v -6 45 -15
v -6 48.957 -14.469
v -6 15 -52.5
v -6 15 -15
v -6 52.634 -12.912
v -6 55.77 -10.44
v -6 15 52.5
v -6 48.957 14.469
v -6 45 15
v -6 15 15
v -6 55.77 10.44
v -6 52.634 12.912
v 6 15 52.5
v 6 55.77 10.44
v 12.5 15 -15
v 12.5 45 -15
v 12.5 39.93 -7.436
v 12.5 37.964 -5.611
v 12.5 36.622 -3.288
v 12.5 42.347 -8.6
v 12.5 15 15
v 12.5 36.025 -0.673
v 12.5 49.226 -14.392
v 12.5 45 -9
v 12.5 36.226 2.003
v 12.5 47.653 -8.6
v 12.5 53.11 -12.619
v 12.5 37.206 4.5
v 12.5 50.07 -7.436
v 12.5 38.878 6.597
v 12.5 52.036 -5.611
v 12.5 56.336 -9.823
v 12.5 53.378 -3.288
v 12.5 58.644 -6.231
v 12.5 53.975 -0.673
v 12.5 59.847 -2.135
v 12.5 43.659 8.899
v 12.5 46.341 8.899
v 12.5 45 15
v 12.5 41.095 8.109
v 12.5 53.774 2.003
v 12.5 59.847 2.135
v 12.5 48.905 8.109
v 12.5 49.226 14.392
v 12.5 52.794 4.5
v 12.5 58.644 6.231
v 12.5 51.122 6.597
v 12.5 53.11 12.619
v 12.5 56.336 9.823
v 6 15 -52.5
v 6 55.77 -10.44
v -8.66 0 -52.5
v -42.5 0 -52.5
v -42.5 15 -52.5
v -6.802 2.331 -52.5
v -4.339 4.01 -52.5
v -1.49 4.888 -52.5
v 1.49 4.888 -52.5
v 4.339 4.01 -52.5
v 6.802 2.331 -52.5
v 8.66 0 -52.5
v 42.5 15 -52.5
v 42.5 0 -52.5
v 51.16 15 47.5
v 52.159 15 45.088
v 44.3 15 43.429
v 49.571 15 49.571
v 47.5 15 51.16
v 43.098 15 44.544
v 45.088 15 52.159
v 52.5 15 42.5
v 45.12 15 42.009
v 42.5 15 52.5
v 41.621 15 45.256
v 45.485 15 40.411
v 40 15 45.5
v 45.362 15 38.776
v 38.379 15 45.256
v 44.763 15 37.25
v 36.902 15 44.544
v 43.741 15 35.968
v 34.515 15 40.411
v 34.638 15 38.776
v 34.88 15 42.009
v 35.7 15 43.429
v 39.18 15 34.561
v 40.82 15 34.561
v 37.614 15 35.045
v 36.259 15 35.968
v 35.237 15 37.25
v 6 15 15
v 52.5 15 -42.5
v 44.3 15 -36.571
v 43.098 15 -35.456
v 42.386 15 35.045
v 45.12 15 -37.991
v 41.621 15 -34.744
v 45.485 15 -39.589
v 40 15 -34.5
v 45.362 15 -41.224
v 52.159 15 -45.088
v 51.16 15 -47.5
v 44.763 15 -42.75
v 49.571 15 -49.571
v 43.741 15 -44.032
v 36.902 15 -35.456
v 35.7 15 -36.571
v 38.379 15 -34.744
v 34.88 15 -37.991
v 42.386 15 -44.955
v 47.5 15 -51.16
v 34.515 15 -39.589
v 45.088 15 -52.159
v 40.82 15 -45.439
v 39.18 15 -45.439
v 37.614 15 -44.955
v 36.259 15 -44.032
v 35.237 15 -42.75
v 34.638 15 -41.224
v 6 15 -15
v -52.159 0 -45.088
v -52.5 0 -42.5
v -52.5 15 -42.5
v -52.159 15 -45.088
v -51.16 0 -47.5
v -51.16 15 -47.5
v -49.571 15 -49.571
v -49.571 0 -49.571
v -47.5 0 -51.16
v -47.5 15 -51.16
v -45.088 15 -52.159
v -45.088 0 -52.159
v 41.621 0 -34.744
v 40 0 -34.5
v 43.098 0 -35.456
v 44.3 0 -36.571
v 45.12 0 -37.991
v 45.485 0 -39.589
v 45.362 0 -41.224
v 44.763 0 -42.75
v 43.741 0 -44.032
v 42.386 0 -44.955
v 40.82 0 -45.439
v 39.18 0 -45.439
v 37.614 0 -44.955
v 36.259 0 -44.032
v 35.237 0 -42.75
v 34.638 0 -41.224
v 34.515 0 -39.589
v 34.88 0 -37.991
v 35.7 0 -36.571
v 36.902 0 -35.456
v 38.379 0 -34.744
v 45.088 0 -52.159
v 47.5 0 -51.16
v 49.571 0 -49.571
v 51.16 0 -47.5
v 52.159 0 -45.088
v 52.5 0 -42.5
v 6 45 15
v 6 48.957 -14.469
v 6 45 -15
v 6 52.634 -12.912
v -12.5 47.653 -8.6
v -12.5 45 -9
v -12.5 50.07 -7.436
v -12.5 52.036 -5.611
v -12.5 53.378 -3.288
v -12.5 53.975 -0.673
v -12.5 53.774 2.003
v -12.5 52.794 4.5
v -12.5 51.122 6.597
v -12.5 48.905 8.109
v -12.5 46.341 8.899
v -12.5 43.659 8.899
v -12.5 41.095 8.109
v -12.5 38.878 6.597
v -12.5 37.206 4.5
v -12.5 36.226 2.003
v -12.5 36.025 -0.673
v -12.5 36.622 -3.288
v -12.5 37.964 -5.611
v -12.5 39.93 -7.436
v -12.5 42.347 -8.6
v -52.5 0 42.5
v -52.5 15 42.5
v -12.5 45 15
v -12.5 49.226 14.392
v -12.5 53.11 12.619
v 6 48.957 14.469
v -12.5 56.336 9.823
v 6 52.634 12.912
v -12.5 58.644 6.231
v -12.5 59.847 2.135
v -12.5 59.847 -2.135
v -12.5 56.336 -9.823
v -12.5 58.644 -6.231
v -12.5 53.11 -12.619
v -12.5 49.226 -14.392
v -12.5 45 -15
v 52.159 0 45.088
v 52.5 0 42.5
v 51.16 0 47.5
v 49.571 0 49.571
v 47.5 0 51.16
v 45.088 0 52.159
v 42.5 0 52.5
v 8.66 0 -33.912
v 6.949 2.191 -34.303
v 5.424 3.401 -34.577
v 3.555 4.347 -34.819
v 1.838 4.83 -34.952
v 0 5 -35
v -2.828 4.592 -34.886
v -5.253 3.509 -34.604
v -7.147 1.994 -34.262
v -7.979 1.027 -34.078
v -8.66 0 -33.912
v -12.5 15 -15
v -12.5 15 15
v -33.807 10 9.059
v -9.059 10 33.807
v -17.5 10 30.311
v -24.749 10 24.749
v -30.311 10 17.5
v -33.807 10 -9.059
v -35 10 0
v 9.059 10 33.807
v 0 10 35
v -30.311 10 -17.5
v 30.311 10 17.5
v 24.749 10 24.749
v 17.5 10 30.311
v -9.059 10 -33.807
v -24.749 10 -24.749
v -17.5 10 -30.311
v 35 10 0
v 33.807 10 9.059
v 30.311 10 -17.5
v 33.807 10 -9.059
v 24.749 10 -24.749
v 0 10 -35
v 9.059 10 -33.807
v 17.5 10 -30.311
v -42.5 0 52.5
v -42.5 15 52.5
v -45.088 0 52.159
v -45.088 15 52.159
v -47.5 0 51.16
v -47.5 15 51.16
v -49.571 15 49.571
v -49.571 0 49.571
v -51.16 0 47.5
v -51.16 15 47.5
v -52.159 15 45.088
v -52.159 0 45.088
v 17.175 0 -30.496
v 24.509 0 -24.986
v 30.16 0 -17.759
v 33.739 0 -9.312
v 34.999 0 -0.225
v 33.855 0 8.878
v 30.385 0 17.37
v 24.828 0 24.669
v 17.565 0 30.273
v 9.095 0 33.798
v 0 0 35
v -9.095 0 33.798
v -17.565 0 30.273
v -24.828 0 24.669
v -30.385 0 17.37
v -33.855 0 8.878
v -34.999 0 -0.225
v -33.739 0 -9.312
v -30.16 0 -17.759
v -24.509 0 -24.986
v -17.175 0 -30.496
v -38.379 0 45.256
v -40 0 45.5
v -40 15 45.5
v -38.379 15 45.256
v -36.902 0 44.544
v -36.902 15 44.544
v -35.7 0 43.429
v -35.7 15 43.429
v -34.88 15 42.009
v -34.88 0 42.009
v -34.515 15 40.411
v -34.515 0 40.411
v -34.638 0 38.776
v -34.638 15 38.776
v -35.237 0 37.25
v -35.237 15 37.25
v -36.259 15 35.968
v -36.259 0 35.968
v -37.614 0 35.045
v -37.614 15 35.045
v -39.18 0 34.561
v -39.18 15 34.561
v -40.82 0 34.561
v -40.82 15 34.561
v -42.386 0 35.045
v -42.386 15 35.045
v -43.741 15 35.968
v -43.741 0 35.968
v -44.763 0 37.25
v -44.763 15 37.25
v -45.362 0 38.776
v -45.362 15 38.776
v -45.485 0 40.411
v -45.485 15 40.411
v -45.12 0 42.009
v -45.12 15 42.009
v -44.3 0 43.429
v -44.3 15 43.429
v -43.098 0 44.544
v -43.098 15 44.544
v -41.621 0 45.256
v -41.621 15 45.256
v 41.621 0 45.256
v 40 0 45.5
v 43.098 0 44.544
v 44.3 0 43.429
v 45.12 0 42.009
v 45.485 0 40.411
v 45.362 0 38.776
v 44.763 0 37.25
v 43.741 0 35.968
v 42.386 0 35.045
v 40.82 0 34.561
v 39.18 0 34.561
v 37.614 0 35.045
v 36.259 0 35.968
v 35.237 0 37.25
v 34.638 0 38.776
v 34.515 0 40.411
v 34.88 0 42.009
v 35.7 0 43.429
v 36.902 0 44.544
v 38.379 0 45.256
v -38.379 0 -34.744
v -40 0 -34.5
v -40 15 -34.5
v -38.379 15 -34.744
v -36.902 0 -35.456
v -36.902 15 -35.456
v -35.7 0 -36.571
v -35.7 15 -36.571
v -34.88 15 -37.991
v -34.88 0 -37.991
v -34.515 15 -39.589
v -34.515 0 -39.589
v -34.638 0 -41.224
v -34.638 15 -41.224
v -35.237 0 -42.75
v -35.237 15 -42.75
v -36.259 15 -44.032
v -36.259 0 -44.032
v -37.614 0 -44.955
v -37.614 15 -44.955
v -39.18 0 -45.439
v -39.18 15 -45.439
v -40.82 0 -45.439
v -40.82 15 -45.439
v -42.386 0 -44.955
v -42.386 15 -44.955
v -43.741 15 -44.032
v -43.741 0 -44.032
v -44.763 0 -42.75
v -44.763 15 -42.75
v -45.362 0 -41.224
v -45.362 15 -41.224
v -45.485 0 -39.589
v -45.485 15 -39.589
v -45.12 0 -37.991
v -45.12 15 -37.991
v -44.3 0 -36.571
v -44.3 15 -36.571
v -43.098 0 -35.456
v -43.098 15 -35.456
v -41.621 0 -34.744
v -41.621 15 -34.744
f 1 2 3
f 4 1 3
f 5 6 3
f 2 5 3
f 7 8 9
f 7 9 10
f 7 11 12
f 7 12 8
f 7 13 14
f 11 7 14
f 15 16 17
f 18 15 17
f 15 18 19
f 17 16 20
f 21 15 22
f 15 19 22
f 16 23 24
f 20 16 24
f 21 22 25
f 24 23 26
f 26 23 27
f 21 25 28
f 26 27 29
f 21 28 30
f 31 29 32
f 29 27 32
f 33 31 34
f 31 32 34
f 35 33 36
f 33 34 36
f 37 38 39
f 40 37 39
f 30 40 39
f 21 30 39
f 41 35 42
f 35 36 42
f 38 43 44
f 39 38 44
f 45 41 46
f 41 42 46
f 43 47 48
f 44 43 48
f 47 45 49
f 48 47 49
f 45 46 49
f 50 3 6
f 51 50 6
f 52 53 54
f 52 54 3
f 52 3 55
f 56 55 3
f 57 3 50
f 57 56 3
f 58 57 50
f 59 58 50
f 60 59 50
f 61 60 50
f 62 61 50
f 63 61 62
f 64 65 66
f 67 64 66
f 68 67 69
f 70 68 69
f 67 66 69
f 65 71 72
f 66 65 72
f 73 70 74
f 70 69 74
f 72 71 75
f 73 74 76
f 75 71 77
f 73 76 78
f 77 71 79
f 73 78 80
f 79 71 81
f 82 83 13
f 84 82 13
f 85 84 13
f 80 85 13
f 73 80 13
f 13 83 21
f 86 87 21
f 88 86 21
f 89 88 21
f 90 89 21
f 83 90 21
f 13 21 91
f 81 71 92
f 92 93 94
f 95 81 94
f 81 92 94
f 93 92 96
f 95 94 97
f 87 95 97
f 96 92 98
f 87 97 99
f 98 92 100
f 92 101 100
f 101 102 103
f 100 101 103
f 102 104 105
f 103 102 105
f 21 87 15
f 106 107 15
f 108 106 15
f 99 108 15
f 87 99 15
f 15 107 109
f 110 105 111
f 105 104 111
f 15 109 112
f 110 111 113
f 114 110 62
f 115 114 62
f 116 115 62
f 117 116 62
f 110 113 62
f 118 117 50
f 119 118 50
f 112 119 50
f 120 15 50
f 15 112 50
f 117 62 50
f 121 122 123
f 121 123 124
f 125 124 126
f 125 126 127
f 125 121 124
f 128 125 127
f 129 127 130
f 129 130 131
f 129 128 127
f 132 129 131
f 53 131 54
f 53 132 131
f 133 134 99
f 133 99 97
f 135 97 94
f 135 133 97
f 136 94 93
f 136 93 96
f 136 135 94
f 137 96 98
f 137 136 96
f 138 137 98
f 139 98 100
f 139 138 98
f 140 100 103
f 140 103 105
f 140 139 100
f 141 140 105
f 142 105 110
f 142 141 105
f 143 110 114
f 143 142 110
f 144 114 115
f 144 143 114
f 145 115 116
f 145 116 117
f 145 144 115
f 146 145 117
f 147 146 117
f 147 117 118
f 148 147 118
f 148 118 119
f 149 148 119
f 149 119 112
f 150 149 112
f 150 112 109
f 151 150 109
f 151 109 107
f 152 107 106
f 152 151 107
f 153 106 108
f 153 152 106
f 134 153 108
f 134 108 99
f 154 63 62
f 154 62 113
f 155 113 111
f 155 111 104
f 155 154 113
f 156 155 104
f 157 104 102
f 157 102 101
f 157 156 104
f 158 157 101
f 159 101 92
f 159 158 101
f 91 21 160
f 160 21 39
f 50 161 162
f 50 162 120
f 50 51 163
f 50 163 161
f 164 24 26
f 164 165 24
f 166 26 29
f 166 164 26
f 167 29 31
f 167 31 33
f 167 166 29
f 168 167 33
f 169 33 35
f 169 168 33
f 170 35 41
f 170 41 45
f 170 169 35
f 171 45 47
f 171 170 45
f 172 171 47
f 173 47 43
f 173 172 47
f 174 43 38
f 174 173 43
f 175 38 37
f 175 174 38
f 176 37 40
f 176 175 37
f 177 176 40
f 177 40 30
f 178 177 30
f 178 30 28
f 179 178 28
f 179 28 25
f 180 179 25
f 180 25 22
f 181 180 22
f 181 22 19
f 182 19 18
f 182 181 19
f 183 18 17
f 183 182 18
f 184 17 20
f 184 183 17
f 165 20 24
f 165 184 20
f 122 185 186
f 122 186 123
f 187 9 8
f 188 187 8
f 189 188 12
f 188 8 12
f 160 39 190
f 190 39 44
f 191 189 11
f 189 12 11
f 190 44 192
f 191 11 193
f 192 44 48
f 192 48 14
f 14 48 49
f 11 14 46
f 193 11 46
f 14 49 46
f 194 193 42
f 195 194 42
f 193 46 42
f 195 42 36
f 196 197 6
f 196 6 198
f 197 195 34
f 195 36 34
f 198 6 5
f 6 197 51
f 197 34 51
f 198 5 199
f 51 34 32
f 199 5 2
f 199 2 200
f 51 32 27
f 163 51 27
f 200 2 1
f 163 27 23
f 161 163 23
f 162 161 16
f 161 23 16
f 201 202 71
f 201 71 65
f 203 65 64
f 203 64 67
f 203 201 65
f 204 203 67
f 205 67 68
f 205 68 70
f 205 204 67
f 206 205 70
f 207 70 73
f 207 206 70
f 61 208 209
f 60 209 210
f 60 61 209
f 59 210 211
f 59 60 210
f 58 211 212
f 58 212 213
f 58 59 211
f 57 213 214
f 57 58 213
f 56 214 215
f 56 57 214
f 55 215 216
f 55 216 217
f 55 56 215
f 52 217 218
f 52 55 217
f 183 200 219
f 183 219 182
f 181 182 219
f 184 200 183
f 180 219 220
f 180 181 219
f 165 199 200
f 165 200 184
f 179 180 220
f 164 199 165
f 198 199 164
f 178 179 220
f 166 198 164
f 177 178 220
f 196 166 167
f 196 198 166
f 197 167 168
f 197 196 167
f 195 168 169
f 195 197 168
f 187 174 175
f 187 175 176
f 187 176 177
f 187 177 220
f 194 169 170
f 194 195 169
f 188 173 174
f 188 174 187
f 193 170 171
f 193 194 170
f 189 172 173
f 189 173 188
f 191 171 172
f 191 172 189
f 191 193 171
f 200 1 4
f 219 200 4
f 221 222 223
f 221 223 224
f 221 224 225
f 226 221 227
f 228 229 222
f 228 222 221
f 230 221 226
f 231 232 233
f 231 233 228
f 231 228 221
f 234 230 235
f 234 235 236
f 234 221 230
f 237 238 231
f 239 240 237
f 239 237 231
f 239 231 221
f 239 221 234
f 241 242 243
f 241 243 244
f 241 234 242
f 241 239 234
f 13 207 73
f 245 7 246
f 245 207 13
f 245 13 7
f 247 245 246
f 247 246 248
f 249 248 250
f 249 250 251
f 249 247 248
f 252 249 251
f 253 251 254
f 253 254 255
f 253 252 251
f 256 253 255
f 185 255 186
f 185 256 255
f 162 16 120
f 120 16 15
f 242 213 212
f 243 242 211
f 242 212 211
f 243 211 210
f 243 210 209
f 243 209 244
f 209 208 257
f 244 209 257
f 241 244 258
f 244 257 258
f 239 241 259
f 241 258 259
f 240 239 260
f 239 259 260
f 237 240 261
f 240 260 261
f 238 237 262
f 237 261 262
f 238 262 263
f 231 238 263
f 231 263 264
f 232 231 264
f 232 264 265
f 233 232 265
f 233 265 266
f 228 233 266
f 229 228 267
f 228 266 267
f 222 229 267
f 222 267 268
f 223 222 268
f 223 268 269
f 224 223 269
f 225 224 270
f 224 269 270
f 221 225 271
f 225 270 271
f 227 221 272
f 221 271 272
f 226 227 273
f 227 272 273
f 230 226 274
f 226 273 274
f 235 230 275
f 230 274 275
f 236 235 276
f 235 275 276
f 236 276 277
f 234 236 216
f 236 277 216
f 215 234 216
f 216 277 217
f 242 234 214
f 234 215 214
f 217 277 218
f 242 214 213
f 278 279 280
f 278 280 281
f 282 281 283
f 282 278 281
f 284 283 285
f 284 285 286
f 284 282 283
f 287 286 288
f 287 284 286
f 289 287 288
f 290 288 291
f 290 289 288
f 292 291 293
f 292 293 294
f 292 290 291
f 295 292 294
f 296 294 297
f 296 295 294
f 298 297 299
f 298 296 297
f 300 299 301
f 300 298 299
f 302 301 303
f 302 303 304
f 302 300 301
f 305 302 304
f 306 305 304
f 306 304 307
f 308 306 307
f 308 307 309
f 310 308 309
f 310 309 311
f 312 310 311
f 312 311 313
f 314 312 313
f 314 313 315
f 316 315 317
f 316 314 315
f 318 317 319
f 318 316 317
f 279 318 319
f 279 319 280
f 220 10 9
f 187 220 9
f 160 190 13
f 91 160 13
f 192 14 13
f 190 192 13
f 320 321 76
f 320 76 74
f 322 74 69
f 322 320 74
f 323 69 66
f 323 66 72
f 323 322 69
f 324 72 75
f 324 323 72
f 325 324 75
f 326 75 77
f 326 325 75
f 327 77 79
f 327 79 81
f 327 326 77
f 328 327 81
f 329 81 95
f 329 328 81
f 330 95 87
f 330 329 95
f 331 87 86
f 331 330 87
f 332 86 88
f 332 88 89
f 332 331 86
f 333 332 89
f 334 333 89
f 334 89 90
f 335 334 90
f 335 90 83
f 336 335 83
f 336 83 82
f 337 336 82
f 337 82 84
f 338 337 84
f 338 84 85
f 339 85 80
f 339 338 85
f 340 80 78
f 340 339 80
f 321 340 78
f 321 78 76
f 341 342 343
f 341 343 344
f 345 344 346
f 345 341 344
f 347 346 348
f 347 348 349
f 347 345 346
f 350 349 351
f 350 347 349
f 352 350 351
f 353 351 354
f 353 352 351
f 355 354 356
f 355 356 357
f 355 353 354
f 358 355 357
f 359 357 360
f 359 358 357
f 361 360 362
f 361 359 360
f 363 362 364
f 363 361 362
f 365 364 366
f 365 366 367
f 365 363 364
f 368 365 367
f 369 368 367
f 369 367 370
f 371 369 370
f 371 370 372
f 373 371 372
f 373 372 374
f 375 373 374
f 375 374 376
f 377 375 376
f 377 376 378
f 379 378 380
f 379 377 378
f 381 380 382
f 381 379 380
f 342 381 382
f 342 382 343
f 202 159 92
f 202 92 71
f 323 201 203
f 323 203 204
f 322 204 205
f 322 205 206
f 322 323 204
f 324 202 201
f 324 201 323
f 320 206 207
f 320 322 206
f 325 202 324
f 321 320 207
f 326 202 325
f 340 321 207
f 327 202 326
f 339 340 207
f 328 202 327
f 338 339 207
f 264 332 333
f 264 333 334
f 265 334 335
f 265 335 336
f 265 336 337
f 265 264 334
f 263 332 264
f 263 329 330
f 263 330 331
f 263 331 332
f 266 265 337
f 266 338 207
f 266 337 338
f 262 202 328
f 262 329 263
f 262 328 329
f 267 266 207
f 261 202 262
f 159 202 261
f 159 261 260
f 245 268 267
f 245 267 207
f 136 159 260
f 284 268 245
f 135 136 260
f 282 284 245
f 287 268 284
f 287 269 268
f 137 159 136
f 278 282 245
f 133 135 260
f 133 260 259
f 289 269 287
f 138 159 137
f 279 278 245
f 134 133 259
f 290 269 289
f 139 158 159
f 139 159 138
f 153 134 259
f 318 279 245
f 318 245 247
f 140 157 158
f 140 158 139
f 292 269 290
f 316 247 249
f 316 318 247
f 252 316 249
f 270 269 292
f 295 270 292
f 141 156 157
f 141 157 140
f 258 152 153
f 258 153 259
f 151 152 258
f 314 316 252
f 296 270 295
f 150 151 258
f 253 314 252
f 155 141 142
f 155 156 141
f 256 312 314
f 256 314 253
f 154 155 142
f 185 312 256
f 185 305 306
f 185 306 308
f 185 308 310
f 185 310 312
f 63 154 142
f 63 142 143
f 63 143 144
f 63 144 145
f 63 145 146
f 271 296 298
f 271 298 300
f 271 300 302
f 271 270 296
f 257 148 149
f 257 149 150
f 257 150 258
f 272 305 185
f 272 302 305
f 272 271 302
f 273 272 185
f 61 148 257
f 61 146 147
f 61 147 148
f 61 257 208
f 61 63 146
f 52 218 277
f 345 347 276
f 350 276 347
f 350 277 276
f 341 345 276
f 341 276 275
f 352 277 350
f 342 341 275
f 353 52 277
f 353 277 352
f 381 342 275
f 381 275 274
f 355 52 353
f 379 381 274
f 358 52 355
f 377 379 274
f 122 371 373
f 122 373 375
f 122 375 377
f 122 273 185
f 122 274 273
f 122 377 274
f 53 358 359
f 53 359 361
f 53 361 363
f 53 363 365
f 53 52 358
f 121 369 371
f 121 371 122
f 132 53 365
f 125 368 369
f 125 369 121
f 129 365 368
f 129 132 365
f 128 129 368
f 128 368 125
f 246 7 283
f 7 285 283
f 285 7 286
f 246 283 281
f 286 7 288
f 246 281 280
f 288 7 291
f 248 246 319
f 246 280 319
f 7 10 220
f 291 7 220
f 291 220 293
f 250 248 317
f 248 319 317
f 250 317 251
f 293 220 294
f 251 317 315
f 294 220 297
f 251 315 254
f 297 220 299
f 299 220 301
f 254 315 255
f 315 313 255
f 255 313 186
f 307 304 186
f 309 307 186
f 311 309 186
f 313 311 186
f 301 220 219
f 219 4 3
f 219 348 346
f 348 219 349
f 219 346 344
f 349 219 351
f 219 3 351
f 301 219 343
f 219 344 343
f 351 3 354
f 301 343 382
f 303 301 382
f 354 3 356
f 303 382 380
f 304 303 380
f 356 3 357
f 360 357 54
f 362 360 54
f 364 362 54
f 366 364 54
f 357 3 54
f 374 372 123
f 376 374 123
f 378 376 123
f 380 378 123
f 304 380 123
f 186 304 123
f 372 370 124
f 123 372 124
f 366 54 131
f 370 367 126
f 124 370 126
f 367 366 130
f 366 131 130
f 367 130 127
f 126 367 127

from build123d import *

# Parameters (mm, degrees)
SKETCH_1_R          = 5.5
EXTRUDE_1_DEPTH     = 15
SKETCH_2_R          = 35
CUT_EXTRUDE_1_DEPTH = 10
SKETCH_3_R          = 10
CUT_EXTRUDE_2_DEPTH = 18.58835
SKETCH_5_R          = 9
EXTRUDE_2_DEPTH     = 12.5
EXTRUDE_3_DEPTH     = 6


with BuildPart() as part:
    # Эскиз1 → Бобышка-Вытянуть1 (new body)
    with BuildSketch(Plane(origin=(0, 0, 0), x_dir=(1, 0, 0), z_dir=(0, 1, 0))):
        with BuildLine():
            Line((42.5, -52.5), (-42.5, -52.5))
            ThreePointArc((-42.5, -52.5), (-49.571067812, -49.571067812), (-52.5, -42.5))
            Line((-52.5, -42.5), (-52.5, 42.5))
            ThreePointArc((-52.5, 42.5), (-49.571067812, 49.571067812), (-42.5, 52.5))
            Line((-42.5, 52.5), (42.5, 52.5))
            ThreePointArc((42.5, 52.5), (49.571067812, 49.571067812), (52.5, 42.5))
            Line((52.5, 42.5), (52.5, -42.5))
            ThreePointArc((52.5, -42.5), (49.571067812, -49.571067812), (42.5, -52.5))
        make_face()
        with Locations(Location((-40, -40, 0), (0, 0, 270))):
            Circle(SKETCH_1_R, mode=Mode.SUBTRACT)
        with Locations(Location((-40, 40, 0), (0, 0, 270))):
            Circle(SKETCH_1_R, mode=Mode.SUBTRACT)
        with Locations(Location((40, 40, 0), (0, 0, 270))):
            Circle(SKETCH_1_R, mode=Mode.SUBTRACT)
        with Locations(Location((40, -40, 0), (0, 0, 270))):
            Circle(SKETCH_1_R, mode=Mode.SUBTRACT)
    extrude(amount=EXTRUDE_1_DEPTH)

    # Эскиз2 → Вырез-Вытянуть1 (cut)
    with BuildSketch(Plane.XZ):
        with Locations(Location((0, 0, 0), (0, 0, 270))):
            Circle(SKETCH_2_R)
    extrude(amount=-CUT_EXTRUDE_1_DEPTH, mode=Mode.SUBTRACT)

    # Эскиз3 → Вырез-Вытянуть2 (cut)
    with BuildSketch(Plane.XY.offset(-52.5)):
        with Locations((0, -5)):
            Circle(SKETCH_3_R)
    extrude(amount=CUT_EXTRUDE_2_DEPTH, mode=Mode.SUBTRACT)

    # Эскиз5 → Бобышка-Вытянуть2 (add, symmetric)
    with BuildSketch(Plane(origin=(0, 0, 0), x_dir=(0, 0, -1), z_dir=(1, 0, 0))):
        with BuildLine():
            Line((15, 45), (15, 15))
            Line((15, 15), (-15, 15))
            Line((-15, 15), (-15, 45))
            ThreePointArc((-15, 45), (0, 60), (15, 45))
        make_face()
        with Locations((0, 45)):
            Circle(SKETCH_5_R, mode=Mode.SUBTRACT)
    extrude(amount=EXTRUDE_2_DEPTH, both=True)

    # Эскиз7 → Бобышка-Вытянуть3 (add, symmetric)
    with BuildSketch(Plane(origin=(0, 0, 0), x_dir=(0, 0, -1), z_dir=(1, 0, 0))):
        Polygon((52.5, 15), (10.44023047, 55.770403323), (10.44023047, 15), align=None)
        Polygon((-52.5, 15), (-10.44023047, 55.770403323), (-10.44023047, 15), align=None)
    extrude(amount=EXTRUDE_3_DEPTH, both=True)


solid = part.part
